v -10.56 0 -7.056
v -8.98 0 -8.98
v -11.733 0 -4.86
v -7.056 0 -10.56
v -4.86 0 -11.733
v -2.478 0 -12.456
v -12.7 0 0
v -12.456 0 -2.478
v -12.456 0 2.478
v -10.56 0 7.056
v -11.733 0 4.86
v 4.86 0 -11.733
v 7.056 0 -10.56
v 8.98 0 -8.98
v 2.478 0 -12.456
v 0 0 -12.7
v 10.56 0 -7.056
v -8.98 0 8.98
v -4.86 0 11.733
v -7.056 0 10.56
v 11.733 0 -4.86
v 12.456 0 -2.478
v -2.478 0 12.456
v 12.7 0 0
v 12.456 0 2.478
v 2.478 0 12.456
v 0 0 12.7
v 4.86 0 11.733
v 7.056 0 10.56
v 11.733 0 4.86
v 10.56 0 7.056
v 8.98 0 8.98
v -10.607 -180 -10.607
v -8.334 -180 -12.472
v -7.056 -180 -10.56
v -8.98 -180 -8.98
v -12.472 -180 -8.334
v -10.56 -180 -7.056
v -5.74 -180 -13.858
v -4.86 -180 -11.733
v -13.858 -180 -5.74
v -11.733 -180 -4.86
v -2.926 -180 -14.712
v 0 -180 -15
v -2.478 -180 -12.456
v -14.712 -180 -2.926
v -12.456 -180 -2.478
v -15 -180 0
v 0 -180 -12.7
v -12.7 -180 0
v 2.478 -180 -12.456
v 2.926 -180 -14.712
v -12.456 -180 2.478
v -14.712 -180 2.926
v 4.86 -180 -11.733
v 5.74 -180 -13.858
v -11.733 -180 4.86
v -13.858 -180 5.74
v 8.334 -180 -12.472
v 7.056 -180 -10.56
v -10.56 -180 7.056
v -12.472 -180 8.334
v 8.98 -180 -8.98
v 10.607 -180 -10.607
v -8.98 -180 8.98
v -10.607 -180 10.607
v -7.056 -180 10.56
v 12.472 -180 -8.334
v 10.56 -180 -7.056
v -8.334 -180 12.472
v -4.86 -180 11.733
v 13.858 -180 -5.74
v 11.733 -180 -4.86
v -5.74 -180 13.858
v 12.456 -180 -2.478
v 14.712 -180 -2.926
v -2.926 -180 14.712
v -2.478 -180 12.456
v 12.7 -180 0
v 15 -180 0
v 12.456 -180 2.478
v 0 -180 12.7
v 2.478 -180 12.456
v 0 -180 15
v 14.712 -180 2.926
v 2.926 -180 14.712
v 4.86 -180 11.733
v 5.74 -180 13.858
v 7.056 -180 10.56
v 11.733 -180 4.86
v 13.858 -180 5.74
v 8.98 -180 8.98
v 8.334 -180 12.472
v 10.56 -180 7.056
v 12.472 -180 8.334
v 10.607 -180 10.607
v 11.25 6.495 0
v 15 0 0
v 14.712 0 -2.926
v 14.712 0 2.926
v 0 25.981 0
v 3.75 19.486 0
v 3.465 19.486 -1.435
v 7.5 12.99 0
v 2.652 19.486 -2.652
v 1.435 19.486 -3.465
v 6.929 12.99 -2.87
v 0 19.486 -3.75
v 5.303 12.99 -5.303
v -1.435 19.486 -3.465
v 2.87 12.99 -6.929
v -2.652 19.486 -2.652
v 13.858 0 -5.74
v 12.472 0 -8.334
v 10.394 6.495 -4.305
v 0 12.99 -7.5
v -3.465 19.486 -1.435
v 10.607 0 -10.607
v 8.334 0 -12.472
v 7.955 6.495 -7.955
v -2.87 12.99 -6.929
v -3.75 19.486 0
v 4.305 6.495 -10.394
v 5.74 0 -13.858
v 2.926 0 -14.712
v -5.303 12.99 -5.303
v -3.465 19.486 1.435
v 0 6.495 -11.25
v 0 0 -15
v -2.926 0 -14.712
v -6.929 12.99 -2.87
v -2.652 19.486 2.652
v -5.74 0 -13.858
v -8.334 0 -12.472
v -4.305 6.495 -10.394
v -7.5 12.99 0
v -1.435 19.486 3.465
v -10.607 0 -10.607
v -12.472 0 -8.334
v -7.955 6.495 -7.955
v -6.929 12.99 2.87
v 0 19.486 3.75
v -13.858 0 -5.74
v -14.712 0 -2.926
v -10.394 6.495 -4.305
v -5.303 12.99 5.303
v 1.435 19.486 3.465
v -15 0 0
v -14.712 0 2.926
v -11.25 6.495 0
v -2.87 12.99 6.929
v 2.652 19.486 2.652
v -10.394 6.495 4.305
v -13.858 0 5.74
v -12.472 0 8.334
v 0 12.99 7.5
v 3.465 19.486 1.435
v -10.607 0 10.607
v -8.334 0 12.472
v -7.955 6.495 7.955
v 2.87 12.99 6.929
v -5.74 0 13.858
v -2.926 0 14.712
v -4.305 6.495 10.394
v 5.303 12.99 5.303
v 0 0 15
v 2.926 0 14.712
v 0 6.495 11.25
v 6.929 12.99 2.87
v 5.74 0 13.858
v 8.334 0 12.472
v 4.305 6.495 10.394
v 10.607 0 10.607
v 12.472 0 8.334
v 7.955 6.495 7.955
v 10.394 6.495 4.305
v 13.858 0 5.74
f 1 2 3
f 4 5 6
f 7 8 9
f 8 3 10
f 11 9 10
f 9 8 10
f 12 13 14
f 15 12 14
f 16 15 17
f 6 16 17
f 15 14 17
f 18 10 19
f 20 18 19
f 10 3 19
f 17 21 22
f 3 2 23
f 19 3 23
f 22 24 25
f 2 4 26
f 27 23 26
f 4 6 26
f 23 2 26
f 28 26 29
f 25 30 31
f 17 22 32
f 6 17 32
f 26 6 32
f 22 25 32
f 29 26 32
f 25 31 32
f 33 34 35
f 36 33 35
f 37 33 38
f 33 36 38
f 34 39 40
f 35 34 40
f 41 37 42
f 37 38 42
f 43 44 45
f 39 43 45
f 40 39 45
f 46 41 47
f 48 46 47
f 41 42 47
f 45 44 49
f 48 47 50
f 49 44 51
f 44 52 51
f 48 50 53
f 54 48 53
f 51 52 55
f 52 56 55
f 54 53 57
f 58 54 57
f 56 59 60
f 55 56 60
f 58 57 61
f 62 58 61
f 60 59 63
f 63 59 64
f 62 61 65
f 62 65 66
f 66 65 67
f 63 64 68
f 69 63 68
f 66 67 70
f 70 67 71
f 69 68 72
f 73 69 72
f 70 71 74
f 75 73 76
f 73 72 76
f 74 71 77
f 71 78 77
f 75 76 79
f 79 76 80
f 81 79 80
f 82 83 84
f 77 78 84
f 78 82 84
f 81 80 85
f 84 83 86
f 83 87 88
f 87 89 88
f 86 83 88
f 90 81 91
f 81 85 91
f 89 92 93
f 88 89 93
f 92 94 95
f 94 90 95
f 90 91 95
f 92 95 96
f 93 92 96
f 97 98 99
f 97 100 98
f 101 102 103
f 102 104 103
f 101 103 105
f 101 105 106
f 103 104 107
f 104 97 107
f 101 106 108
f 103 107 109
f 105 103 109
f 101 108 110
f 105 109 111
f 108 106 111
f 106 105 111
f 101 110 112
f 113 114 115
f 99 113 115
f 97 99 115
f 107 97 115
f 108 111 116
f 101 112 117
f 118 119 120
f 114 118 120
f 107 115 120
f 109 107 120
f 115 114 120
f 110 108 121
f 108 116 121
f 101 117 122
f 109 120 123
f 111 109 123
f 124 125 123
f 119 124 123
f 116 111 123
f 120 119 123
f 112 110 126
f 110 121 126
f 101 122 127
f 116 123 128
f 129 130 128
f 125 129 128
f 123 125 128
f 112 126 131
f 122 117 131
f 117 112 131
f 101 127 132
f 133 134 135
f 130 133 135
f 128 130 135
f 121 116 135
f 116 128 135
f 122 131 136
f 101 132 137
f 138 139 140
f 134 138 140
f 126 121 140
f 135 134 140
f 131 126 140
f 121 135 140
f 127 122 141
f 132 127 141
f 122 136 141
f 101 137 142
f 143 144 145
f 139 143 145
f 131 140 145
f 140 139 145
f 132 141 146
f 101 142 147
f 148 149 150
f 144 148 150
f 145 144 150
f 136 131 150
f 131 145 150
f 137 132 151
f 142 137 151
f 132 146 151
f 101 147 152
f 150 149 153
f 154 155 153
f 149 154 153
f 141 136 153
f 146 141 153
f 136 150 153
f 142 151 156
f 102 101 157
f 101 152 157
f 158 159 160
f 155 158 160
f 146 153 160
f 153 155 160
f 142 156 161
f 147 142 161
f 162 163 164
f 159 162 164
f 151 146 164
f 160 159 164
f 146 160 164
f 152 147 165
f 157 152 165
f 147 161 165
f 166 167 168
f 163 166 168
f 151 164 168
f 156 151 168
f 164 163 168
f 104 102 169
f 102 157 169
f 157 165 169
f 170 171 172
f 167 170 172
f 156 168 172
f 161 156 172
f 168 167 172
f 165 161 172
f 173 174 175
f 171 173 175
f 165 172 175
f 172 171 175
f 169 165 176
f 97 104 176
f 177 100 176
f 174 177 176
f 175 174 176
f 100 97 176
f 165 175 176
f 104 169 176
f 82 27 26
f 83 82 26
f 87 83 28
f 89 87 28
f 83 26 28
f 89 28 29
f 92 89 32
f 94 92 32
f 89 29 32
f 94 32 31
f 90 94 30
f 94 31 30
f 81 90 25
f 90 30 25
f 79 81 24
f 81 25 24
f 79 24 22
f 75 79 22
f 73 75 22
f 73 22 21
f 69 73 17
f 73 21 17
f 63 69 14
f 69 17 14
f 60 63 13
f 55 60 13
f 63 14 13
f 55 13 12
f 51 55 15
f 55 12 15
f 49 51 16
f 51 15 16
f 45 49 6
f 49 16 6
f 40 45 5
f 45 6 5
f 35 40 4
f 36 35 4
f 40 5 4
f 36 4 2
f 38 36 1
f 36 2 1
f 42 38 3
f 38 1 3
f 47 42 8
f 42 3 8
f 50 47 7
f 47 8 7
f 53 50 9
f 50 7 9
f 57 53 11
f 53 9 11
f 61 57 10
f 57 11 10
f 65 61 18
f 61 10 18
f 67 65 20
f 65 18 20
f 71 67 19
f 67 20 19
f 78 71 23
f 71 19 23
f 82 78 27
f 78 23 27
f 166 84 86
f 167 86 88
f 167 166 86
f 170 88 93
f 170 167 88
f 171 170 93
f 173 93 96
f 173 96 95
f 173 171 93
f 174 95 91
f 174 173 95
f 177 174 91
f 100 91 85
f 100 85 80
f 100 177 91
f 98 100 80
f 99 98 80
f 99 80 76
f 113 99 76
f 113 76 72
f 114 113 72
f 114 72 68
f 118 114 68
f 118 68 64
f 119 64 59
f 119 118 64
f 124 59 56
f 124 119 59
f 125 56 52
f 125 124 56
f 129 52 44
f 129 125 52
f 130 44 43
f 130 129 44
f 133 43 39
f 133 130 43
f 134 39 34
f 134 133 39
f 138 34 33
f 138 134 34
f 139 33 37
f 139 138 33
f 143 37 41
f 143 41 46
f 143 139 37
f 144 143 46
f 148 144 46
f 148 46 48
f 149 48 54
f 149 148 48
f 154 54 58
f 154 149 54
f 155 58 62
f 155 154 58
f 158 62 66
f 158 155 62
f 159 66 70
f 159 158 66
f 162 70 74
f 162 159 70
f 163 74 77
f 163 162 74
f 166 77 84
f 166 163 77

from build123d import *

# Parameters (mm, degrees)
SKETCH1_R           = 15
BOSS_EXTRUDE4_DEPTH = 200
SKETCH1_7_R         = 15
SKETCH1_7_R_2       = 12.7
BOSS_EXTRUDE5_DEPTH = 180


# Read off the part's stored shape, not the designer's step: Draft4
with BuildPart() as part:
    # Sketch1 → Boss-Extrude4 (new body)
    with BuildSketch(Plane(origin=(0, 0, 0), x_dir=(1, 0, 0), z_dir=(0, 1, 0))):
        with Locations(Location((0, 0, 0), (0, 0, 270))):
            Circle(SKETCH1_R)
    extrude(amount=BOSS_EXTRUDE4_DEPTH)

    # Draft4 outline → Draft4 (revolve, cut)
    with BuildSketch(Plane.XY):
        Polygon((15, 0), (15, 200), (0, 200), (0, 25.980762114), align=None)
    revolve(axis=Axis((0, 0, 0), (0, 1, 0)), mode=Mode.SUBTRACT)

    # Sketch1<7> → Boss-Extrude5 (add)
    with BuildSketch(Plane(origin=(0, 0, 0), x_dir=(1, 0, 0), z_dir=(0, 1, 0))):
        with Locations(Location((0, 0, 0), (0, 0, 270))):
            Circle(SKETCH1_7_R)
        with Locations(Location((0, 0, 0), (0, 0, 270))):
            Circle(SKETCH1_7_R_2, mode=Mode.SUBTRACT)
    extrude(amount=-BOSS_EXTRUDE5_DEPTH)


solid = part.part
